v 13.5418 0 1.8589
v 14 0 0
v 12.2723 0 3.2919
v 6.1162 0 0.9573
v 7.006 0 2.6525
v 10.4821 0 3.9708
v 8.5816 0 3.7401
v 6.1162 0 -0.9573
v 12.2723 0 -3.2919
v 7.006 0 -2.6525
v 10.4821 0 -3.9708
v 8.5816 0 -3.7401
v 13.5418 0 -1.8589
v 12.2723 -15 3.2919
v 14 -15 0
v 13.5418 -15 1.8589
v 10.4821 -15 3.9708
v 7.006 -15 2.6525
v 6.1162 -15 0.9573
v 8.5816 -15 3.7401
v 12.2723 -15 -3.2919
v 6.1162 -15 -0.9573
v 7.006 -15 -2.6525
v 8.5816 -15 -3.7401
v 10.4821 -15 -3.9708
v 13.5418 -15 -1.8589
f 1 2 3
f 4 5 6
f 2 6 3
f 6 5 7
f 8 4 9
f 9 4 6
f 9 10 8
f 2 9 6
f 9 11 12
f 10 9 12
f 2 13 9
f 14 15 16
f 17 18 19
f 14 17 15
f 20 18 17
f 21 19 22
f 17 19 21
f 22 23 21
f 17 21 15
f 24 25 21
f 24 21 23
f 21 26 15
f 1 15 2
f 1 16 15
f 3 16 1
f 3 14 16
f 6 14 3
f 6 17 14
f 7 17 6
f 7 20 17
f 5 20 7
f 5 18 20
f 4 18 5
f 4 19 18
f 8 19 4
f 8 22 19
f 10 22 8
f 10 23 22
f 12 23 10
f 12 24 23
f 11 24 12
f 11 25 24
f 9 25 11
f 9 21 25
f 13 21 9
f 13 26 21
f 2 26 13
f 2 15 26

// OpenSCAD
translate([10, 0, 0]) rotate([90, 0, 0]) linear_extrude(height = 15) circle(r = 4);
